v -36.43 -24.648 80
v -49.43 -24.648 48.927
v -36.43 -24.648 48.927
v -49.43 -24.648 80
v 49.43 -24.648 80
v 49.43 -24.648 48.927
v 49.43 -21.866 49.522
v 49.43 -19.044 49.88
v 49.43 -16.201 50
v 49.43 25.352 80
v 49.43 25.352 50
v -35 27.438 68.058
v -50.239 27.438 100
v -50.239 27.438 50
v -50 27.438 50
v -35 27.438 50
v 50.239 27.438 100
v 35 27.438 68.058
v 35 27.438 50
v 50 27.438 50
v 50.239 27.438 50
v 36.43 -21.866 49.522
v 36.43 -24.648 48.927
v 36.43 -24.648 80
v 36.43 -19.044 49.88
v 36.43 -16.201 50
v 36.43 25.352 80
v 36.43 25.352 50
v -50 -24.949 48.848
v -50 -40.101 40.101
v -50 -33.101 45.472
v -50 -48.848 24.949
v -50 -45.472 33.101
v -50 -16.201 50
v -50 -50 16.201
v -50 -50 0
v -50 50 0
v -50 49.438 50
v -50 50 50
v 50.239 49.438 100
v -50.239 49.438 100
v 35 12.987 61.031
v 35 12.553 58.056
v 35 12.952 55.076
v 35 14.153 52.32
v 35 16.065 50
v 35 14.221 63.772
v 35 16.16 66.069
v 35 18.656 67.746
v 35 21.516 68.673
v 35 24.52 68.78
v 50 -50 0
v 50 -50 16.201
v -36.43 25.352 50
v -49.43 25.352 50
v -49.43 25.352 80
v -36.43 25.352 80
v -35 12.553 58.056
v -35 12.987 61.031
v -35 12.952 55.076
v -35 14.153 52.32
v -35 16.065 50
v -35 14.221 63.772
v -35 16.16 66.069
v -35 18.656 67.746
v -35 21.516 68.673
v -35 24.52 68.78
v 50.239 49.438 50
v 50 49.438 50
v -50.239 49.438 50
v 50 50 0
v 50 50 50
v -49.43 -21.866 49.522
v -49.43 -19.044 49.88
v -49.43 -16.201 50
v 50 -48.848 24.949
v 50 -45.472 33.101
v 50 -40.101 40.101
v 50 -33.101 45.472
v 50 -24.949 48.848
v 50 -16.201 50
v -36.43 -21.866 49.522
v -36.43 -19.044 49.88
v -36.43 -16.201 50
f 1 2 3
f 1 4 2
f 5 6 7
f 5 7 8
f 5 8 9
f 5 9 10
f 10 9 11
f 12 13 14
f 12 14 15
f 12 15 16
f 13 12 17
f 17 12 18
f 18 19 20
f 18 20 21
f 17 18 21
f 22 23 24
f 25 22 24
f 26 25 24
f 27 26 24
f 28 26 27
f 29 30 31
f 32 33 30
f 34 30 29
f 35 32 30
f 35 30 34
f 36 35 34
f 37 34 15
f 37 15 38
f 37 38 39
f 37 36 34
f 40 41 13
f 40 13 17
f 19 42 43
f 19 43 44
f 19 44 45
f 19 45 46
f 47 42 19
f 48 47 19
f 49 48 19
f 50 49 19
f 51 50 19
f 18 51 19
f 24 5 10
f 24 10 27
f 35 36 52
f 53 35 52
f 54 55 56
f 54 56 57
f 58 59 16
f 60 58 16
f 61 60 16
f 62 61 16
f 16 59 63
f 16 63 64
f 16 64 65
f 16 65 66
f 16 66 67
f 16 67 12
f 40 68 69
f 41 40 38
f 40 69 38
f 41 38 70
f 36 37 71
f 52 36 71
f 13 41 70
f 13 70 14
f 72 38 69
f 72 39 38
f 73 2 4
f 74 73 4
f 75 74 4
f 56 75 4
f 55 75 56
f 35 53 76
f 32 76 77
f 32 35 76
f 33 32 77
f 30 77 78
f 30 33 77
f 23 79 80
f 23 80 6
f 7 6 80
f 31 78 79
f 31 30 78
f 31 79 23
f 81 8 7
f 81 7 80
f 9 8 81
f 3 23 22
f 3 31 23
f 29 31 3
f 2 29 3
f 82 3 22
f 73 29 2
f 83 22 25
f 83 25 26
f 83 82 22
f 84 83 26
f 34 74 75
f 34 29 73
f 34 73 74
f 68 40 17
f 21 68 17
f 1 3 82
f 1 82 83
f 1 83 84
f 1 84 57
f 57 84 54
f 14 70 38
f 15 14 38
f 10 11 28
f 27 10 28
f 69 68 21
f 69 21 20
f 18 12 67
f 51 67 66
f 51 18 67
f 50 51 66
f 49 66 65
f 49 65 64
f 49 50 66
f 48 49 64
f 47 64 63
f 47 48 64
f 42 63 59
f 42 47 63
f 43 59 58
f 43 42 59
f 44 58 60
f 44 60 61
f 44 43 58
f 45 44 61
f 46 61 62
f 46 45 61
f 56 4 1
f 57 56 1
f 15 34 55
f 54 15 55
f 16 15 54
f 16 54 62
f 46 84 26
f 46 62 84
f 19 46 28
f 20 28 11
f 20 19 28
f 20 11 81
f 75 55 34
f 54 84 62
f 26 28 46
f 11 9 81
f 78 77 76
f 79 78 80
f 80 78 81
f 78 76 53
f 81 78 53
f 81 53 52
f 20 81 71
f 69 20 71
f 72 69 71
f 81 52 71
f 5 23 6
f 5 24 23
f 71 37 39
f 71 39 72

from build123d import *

# Parameters (mm, degrees)
F0_W          = 100
F0_H          = 100
F1_DEPTH      = 50
F4_DEPTH      = 50
F5_W          = 13
F5_H          = 50
F6_DEPTH      = 30
F8_R          = 10.8467438632
F9_DEPTH      = 35
F10_T4_DEPTH  = 268.9949493661
F10_T9_DEPTH  = 268.9949493661
F10_T14_DEPTH = 268.9949493661
F10_T20_DEPTH = 268.9949493661


# Not quite as in the source:
# - a fillet or chamfer that OpenCascade refuses, or shapes differently, is made with other operations: its cross-section is extruded or revolved along the edge and cut away or added


with BuildPart() as f1:
    # F0 (on Top) → F1 (new body)
    with BuildSketch(Plane.XY):
        Rectangle(F0_W, F0_H)
    extrude(amount=F1_DEPTH)

    # F3 (on offset) → F4 (join)
    with BuildSketch(Plane.XY.offset(50)):
        Polygon((49.7613176703, 49.4384859949), (-50.2386823297, 49.4384859949), (-50.2386823297, 27.4384859949), (-42.6304154098, 27.4384859949), (49.7613176703, 27.4384859949), align=None)
    extrude(amount=F4_DEPTH)

    # F5 (on offset) → F6 (join)
    with BuildSketch(Plane.XY.offset(50)):
        with Locations((-42.9296287298, 0.3518681973)):
            Rectangle(F5_W, F5_H)
    extrude(amount=F6_DEPTH)

    # F7: F1 across plane


with BuildPart() as f1_1:
    add(f1.part)
    add(f1.part.mirror(Plane.YZ))

    # F8 (on Right) → F9 (join, symmetric)
    with BuildSketch(Plane.YZ):
        with Locations((23.399380967, 57.991553098)):
            Circle(F8_R)
    extrude(amount=F9_DEPTH, both=True)

    # F10: fillet of radius 33.7989898732 on 1 edges, made by hand


with BuildPart() as f10_tool2:
    # F10_s3 → F10_t4 (new body)
    with BuildSketch(Plane.YZ.offset(-134.4974746831)):
        with BuildLine():
            ThreePointArc((-50, 16.2010101268), (-40.1005050634, 40.1005050634), (-16.2010101268, 50))
            Line((-16.2010101268, 50), (-50, 50))
            Line((-50, 50), (-50, 16.2010101268))
        make_face()
    extrude(amount=F10_T4_DEPTH)

    split(bisect_by=Plane.XZ.offset(24.6481318027), keep=Keep.TOP)


with BuildPart() as f1_2:
    add(f1_1.part)

    # F10_t1: cut F10_tool2
    add(f10_tool2.part, mode=Mode.SUBTRACT)


with BuildPart() as f10_tool7:
    # F10_s8 → F10_t9 (new body)
    with BuildSketch(Plane.YZ.offset(-134.4974746831)):
        with BuildLine():
            ThreePointArc((-50, 16.2010101268), (-40.1005050634, 40.1005050634), (-16.2010101268, 50))
            Line((-16.2010101268, 50), (-50, 50))
            Line((-50, 50), (-50, 16.2010101268))
        make_face()
    extrude(amount=F10_T9_DEPTH)

    split(bisect_by=Plane.YZ.offset(-49.4296287298), keep=Keep.BOTTOM)


with BuildPart() as f1_3:
    add(f1_2.part)

    # F10_t6: cut F10_tool7
    add(f10_tool7.part, mode=Mode.SUBTRACT)


with BuildPart() as f10_tool12:
    # F10_s13 → F10_t14 (new body)
    with BuildSketch(Plane.YZ.offset(-134.4974746831)):
        with BuildLine():
            ThreePointArc((-50, 16.2010101268), (-40.1005050634, 40.1005050634), (-16.2010101268, 50))
            Line((-16.2010101268, 50), (-50, 50))
            Line((-50, 50), (-50, 16.2010101268))
        make_face()
    extrude(amount=F10_T14_DEPTH)

    split(bisect_by=Plane.YZ.offset(-36.4296287298), keep=Keep.TOP)

    split(bisect_by=Plane.YZ.offset(36.4296287298), keep=Keep.BOTTOM)


with BuildPart() as f1_4:
    add(f1_3.part)

    # F10_t11: cut F10_tool12
    add(f10_tool12.part, mode=Mode.SUBTRACT)


with BuildPart() as f10_tool18:
    # F10_s19 → F10_t20 (new body)
    with BuildSketch(Plane.YZ.offset(-134.4974746831)):
        with BuildLine():
            ThreePointArc((-50, 16.2010101268), (-40.1005050634, 40.1005050634), (-16.2010101268, 50))
            Line((-16.2010101268, 50), (-50, 50))
            Line((-50, 50), (-50, 16.2010101268))
        make_face()
    extrude(amount=F10_T20_DEPTH)

    split(bisect_by=Plane.YZ.offset(49.4296287298), keep=Keep.TOP)


with BuildPart() as f1_5:
    add(f1_4.part)

    # F10_t17: cut F10_tool18
    add(f10_tool18.part, mode=Mode.SUBTRACT)


solid = f1_5.part
